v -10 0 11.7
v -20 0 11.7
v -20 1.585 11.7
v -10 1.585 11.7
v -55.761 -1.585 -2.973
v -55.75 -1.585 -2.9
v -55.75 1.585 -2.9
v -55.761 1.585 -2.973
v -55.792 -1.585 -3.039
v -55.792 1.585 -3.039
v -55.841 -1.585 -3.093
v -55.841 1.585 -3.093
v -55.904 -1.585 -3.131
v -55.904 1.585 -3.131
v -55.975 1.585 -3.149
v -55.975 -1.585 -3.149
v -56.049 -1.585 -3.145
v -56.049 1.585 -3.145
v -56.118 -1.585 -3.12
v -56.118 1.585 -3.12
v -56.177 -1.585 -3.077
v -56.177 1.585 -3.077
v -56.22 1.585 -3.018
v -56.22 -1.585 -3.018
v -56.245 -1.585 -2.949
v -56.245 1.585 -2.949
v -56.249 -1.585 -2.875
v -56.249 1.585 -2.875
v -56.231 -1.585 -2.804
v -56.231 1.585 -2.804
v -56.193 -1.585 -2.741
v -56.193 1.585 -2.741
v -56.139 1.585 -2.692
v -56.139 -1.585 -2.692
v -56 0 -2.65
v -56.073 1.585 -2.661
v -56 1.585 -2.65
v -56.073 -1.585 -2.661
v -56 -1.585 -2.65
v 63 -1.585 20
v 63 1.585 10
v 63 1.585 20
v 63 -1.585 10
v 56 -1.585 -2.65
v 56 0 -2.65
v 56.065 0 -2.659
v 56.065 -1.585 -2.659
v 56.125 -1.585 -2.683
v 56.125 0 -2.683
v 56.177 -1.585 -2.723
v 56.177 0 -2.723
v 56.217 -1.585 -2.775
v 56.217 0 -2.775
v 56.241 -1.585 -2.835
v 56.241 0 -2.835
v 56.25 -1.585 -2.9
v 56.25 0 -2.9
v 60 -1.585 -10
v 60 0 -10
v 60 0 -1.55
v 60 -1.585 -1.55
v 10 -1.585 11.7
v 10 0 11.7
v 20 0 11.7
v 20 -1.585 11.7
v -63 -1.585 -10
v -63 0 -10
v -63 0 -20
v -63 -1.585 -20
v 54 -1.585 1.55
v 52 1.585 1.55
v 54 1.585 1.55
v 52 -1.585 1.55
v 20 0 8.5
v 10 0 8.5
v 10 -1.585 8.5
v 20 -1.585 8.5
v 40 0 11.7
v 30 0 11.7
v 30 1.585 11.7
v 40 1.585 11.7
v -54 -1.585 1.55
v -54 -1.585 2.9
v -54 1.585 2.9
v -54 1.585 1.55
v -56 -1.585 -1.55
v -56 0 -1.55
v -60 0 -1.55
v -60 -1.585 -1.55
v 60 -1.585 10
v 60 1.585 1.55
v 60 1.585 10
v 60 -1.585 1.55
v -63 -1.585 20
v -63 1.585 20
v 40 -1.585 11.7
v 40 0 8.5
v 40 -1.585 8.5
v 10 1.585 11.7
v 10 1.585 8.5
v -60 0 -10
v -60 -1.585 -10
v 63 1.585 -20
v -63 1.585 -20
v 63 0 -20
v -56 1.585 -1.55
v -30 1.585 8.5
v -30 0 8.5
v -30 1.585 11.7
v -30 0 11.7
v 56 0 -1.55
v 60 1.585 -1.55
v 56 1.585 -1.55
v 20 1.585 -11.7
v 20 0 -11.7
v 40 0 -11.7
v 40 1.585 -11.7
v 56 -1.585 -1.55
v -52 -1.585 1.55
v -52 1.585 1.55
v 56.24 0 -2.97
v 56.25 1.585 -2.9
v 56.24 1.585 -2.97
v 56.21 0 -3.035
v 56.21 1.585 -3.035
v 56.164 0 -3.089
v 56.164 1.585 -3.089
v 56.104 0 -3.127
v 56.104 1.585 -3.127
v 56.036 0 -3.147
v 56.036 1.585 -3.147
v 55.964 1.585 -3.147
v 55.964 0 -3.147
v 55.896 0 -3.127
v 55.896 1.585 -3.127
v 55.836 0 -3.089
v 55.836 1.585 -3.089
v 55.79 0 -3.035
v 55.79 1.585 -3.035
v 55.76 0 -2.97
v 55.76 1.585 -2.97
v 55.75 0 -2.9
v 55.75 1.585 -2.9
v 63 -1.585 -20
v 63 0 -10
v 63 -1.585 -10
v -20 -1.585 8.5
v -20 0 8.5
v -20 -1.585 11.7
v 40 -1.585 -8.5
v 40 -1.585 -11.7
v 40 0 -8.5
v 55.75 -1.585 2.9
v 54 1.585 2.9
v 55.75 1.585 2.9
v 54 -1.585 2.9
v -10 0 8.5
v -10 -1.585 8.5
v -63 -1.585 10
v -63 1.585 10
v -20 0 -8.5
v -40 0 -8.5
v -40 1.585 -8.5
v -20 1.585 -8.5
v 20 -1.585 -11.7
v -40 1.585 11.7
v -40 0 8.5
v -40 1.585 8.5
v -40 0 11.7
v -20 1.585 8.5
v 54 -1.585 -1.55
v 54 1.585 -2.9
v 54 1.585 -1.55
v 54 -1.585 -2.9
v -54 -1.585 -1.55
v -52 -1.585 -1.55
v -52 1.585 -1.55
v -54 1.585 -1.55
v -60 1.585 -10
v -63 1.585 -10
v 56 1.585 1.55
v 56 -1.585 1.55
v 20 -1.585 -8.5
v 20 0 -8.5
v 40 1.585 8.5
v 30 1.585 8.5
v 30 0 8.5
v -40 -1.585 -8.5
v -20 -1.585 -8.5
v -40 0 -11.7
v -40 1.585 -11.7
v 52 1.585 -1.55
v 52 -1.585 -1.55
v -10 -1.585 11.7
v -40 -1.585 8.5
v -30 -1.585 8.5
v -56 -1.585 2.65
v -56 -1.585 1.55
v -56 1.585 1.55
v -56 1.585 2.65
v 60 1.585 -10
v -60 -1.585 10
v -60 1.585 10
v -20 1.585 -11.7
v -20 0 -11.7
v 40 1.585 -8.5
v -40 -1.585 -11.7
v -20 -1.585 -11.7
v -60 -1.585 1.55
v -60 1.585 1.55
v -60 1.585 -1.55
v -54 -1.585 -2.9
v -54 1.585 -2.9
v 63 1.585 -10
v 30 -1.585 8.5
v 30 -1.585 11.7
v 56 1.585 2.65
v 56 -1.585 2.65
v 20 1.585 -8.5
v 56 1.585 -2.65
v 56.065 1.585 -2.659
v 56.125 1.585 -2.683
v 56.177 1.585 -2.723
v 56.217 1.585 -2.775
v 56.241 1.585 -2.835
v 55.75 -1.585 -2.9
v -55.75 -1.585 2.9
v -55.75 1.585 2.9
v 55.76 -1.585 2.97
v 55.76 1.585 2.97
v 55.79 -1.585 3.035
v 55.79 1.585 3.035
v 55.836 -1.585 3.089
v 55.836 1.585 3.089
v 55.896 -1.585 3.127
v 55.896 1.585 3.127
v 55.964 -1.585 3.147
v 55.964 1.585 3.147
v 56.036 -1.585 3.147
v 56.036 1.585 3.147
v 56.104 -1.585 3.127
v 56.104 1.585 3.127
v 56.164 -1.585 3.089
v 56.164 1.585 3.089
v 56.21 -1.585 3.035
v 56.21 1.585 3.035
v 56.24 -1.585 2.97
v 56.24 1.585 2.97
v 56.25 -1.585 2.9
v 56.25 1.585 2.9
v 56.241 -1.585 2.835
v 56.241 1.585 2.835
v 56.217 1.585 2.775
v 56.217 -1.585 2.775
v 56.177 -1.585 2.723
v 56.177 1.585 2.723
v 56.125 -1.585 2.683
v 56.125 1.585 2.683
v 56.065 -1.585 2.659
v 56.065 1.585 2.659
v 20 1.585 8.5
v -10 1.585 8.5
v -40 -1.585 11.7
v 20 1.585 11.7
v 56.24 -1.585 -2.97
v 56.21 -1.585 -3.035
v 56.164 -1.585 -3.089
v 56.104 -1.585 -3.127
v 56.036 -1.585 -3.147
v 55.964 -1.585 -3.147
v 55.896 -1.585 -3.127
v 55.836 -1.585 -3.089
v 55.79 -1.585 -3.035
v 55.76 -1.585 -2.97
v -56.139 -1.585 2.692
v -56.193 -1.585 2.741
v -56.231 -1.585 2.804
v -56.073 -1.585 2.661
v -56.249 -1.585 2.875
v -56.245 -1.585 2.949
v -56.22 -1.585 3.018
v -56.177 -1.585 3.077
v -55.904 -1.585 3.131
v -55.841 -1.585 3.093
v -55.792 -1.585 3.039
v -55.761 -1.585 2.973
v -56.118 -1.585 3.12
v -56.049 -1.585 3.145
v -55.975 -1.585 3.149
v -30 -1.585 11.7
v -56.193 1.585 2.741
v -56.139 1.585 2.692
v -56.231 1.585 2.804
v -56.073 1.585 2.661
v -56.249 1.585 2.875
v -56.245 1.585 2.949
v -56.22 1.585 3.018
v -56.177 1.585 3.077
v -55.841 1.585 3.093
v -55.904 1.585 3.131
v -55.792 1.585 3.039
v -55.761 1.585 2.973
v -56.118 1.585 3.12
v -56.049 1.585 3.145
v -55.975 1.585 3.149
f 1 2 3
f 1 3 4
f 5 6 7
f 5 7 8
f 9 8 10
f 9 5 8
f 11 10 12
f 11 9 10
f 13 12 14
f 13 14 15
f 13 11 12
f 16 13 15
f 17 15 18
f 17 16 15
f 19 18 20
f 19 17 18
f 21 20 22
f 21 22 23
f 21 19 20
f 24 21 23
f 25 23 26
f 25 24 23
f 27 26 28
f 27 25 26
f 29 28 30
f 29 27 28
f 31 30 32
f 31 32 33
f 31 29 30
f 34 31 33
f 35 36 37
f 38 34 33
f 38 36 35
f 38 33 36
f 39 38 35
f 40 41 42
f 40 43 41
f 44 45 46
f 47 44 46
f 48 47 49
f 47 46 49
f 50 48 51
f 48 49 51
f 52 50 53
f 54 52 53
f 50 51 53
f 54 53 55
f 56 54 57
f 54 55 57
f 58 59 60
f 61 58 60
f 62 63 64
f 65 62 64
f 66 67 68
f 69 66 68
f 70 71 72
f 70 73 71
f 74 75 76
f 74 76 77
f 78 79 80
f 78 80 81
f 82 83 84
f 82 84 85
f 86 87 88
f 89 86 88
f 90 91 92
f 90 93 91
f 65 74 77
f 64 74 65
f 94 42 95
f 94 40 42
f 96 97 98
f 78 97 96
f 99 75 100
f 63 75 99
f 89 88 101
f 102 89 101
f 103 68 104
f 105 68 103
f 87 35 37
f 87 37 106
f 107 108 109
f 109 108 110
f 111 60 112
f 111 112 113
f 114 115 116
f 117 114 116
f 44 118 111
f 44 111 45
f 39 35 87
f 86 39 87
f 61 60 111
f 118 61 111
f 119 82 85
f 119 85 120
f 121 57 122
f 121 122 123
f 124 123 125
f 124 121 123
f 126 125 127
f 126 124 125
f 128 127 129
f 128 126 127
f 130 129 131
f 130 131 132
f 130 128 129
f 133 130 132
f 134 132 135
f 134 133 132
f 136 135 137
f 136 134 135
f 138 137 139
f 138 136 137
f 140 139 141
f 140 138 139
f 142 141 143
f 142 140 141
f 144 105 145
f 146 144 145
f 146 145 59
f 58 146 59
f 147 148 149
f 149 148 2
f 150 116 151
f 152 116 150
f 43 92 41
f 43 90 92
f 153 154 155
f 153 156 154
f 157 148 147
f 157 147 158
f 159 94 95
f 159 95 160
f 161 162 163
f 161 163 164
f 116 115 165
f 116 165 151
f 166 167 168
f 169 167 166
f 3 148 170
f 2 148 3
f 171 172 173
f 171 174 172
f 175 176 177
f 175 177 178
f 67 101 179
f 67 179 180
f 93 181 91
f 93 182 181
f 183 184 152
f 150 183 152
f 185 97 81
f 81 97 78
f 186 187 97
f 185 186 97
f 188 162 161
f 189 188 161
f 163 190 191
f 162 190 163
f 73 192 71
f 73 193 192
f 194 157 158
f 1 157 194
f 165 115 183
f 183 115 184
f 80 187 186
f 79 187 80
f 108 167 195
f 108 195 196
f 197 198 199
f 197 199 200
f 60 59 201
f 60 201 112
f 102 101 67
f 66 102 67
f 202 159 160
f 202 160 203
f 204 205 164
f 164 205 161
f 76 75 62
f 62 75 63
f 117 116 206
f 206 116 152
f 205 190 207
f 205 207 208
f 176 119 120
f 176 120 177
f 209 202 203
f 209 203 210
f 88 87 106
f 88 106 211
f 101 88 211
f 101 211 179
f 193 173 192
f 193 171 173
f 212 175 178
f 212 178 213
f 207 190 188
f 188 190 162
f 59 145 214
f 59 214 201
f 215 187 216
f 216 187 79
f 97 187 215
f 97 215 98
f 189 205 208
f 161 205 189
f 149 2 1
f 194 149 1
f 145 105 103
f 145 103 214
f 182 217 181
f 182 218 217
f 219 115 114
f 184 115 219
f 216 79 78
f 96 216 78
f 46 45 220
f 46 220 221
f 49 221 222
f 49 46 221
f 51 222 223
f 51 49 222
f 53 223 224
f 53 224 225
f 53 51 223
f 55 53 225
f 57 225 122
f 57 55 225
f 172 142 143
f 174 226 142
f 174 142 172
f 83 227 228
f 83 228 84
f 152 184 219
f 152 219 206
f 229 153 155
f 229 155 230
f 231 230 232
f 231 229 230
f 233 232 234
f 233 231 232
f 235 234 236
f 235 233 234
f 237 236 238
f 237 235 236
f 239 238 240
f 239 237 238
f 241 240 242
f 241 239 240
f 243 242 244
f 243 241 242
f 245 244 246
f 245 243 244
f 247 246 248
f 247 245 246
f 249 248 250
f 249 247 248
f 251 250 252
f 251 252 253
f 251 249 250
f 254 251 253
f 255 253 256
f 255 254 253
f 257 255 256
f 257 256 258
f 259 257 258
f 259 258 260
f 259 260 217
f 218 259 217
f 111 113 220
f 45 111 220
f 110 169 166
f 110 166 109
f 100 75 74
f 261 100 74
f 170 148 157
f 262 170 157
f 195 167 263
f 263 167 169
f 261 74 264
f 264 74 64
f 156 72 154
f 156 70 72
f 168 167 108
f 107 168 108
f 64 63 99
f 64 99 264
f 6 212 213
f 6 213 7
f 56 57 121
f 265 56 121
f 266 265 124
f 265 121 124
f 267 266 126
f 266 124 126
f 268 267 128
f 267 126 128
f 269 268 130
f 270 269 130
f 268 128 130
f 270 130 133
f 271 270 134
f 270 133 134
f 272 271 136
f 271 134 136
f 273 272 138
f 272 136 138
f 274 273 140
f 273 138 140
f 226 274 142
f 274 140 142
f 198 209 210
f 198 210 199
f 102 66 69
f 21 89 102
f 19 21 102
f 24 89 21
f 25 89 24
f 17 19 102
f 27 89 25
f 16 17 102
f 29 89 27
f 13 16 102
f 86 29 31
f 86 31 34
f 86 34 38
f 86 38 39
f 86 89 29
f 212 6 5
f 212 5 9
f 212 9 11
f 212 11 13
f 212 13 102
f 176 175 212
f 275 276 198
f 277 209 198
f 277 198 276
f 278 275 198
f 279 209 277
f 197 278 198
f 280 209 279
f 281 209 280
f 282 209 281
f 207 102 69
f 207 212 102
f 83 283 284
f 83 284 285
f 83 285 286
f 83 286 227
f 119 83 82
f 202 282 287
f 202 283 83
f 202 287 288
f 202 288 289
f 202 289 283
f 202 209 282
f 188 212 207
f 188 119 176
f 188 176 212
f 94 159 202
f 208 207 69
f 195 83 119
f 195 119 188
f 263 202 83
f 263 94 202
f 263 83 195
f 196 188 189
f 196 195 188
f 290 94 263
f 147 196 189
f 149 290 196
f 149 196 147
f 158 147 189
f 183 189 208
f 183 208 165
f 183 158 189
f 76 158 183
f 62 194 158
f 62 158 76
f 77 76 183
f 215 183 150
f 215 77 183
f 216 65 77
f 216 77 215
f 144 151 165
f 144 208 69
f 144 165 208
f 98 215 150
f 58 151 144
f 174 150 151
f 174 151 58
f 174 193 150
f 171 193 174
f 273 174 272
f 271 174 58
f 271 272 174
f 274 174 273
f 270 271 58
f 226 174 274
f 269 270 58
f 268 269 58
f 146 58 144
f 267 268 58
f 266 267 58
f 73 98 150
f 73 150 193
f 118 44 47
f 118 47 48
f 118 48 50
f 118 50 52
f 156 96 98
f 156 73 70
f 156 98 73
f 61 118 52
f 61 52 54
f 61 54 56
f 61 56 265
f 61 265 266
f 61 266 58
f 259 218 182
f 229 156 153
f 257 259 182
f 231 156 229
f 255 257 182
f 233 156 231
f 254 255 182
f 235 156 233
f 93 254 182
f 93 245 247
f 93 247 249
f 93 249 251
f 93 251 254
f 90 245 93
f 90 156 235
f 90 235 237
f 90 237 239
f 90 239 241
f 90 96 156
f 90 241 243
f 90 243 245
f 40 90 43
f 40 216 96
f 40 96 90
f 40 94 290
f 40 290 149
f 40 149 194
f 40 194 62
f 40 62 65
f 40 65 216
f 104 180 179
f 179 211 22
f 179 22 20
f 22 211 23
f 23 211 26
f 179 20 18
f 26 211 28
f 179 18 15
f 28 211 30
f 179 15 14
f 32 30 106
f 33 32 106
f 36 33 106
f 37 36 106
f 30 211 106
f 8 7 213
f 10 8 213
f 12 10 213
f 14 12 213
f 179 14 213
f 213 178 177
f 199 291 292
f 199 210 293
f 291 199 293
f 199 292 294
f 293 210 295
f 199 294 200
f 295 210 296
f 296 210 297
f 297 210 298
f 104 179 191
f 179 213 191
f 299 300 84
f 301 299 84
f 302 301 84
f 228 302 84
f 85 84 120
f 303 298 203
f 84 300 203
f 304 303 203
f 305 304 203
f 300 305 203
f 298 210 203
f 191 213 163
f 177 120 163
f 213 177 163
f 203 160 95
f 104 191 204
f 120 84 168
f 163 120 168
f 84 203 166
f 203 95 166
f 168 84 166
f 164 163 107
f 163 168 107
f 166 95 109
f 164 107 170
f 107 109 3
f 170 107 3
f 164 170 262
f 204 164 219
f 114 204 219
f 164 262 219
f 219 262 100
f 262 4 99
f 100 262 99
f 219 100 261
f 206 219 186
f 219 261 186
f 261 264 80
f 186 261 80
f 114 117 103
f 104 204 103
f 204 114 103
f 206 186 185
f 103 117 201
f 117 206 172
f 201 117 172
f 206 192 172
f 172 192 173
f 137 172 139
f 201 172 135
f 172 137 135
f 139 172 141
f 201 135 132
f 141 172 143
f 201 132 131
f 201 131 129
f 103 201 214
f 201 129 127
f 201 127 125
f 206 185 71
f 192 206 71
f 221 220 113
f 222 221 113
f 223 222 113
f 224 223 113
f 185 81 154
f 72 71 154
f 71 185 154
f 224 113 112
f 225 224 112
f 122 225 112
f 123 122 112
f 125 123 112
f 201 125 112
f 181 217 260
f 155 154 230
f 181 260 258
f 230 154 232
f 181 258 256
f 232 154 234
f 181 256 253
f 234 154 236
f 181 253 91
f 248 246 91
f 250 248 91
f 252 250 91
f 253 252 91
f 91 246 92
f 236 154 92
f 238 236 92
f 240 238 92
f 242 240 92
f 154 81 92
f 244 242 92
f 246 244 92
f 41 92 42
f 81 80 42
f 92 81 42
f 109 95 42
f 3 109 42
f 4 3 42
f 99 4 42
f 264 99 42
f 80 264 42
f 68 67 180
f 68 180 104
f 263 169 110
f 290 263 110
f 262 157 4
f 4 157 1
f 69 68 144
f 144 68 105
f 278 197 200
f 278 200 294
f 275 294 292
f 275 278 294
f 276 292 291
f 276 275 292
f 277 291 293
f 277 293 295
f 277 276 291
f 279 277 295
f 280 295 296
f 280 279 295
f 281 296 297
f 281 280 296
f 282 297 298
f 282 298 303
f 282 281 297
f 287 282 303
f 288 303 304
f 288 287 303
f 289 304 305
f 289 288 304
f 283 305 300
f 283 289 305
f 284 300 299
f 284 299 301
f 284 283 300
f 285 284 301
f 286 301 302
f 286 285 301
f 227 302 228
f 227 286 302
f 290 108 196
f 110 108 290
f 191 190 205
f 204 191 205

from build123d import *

# Parameters (mm, degrees)
F0_W     = 20
F0_H     = 3.2
F0_W_2   = 10
F1_DEPTH = 1.585


with BuildPart() as f1:
    # F0 (on Front) → F1 (new body, symmetric)
    with BuildSketch(Plane.XZ):
        with BuildLine():
            Line((63, 20), (0, 20))
            Line((0, 20), (-63, 20))
            Line((-63, 20), (-63, 10))
            Line((-63, 10), (-60, 10))
            Line((-60, 10), (-60, 1.55))
            Line((-60, 1.55), (-56, 1.55))
            Line((-56, 1.55), (-56, 2.65))
            ThreePointArc((-56, 2.65), (-56.1767766953, 3.0767766953), (-55.75, 2.9))
            Line((-55.75, 2.9), (-54, 2.9))
            Line((-54, 2.9), (-54, 1.55))
            Line((-54, 1.55), (-52, 1.55))
            Line((-52, 1.55), (-52, 0))
            Line((-52, 0), (-52, -1.55))
            Line((-52, -1.55), (-54, -1.55))
            Line((-54, -1.55), (-54, -2.9))
            Line((-54, -2.9), (-55.75, -2.9))
            ThreePointArc((-55.75, -2.9), (-56.1767766953, -3.0767766953), (-56, -2.65))
            Line((-56, -2.65), (-56, -1.55))
            Line((-56, -1.55), (-60, -1.55))
            Line((-60, -1.55), (-60, -10))
            Line((-60, -10), (-63, -10))
            Line((-63, -10), (-63, -20))
            Line((-63, -20), (0, -20))
            Line((0, -20), (63, -20))
            Line((63, -20), (63, -10))
            Line((63, -10), (60, -10))
            Line((60, -10), (60, -1.55))
            Line((60, -1.55), (56, -1.55))
            Line((56, -1.55), (56, -2.65))
            ThreePointArc((56, -2.65), (56.1767766953, -2.7232233047), (56.25, -2.9))
            ThreePointArc((56.25, -2.9), (56, -3.15), (55.75, -2.9))
            Line((55.75, -2.9), (54, -2.9))
            Line((54, -2.9), (54, -1.55))
            Line((54, -1.55), (52, -1.55))
            Line((52, -1.55), (52, 0))
            Line((52, 0), (52, 1.55))
            Line((52, 1.55), (54, 1.55))
            Line((54, 1.55), (54, 2.9))
            Line((54, 2.9), (55.75, 2.9))
            ThreePointArc((55.75, 2.9), (56, 3.15), (56.25, 2.9))
            ThreePointArc((56.25, 2.9), (56.1767766953, 2.7232233047), (56, 2.65))
            Line((56, 2.65), (56, 1.55))
            Line((56, 1.55), (60, 1.55))
            Line((60, 1.55), (60, 10))
            Line((60, 10), (63, 10))
            Line((63, 10), (63, 20))
        make_face()
        with Locations((-30, -10.1)):
            Rectangle(F0_W, F0_H, mode=Mode.SUBTRACT)
        with Locations((30, -10.1)):
            Rectangle(F0_W, F0_H, mode=Mode.SUBTRACT)
        with Locations((-35, 10.1)):
            Rectangle(F0_W_2, F0_H, mode=Mode.SUBTRACT)
        with Locations((-15, 10.1)):
            Rectangle(F0_W_2, F0_H, mode=Mode.SUBTRACT)
        with Locations((15, 10.1)):
            Rectangle(F0_W_2, F0_H, mode=Mode.SUBTRACT)
        with Locations((35, 10.1)):
            Rectangle(F0_W_2, F0_H, mode=Mode.SUBTRACT)
    extrude(amount=F1_DEPTH, both=True)


solid = f1.part
